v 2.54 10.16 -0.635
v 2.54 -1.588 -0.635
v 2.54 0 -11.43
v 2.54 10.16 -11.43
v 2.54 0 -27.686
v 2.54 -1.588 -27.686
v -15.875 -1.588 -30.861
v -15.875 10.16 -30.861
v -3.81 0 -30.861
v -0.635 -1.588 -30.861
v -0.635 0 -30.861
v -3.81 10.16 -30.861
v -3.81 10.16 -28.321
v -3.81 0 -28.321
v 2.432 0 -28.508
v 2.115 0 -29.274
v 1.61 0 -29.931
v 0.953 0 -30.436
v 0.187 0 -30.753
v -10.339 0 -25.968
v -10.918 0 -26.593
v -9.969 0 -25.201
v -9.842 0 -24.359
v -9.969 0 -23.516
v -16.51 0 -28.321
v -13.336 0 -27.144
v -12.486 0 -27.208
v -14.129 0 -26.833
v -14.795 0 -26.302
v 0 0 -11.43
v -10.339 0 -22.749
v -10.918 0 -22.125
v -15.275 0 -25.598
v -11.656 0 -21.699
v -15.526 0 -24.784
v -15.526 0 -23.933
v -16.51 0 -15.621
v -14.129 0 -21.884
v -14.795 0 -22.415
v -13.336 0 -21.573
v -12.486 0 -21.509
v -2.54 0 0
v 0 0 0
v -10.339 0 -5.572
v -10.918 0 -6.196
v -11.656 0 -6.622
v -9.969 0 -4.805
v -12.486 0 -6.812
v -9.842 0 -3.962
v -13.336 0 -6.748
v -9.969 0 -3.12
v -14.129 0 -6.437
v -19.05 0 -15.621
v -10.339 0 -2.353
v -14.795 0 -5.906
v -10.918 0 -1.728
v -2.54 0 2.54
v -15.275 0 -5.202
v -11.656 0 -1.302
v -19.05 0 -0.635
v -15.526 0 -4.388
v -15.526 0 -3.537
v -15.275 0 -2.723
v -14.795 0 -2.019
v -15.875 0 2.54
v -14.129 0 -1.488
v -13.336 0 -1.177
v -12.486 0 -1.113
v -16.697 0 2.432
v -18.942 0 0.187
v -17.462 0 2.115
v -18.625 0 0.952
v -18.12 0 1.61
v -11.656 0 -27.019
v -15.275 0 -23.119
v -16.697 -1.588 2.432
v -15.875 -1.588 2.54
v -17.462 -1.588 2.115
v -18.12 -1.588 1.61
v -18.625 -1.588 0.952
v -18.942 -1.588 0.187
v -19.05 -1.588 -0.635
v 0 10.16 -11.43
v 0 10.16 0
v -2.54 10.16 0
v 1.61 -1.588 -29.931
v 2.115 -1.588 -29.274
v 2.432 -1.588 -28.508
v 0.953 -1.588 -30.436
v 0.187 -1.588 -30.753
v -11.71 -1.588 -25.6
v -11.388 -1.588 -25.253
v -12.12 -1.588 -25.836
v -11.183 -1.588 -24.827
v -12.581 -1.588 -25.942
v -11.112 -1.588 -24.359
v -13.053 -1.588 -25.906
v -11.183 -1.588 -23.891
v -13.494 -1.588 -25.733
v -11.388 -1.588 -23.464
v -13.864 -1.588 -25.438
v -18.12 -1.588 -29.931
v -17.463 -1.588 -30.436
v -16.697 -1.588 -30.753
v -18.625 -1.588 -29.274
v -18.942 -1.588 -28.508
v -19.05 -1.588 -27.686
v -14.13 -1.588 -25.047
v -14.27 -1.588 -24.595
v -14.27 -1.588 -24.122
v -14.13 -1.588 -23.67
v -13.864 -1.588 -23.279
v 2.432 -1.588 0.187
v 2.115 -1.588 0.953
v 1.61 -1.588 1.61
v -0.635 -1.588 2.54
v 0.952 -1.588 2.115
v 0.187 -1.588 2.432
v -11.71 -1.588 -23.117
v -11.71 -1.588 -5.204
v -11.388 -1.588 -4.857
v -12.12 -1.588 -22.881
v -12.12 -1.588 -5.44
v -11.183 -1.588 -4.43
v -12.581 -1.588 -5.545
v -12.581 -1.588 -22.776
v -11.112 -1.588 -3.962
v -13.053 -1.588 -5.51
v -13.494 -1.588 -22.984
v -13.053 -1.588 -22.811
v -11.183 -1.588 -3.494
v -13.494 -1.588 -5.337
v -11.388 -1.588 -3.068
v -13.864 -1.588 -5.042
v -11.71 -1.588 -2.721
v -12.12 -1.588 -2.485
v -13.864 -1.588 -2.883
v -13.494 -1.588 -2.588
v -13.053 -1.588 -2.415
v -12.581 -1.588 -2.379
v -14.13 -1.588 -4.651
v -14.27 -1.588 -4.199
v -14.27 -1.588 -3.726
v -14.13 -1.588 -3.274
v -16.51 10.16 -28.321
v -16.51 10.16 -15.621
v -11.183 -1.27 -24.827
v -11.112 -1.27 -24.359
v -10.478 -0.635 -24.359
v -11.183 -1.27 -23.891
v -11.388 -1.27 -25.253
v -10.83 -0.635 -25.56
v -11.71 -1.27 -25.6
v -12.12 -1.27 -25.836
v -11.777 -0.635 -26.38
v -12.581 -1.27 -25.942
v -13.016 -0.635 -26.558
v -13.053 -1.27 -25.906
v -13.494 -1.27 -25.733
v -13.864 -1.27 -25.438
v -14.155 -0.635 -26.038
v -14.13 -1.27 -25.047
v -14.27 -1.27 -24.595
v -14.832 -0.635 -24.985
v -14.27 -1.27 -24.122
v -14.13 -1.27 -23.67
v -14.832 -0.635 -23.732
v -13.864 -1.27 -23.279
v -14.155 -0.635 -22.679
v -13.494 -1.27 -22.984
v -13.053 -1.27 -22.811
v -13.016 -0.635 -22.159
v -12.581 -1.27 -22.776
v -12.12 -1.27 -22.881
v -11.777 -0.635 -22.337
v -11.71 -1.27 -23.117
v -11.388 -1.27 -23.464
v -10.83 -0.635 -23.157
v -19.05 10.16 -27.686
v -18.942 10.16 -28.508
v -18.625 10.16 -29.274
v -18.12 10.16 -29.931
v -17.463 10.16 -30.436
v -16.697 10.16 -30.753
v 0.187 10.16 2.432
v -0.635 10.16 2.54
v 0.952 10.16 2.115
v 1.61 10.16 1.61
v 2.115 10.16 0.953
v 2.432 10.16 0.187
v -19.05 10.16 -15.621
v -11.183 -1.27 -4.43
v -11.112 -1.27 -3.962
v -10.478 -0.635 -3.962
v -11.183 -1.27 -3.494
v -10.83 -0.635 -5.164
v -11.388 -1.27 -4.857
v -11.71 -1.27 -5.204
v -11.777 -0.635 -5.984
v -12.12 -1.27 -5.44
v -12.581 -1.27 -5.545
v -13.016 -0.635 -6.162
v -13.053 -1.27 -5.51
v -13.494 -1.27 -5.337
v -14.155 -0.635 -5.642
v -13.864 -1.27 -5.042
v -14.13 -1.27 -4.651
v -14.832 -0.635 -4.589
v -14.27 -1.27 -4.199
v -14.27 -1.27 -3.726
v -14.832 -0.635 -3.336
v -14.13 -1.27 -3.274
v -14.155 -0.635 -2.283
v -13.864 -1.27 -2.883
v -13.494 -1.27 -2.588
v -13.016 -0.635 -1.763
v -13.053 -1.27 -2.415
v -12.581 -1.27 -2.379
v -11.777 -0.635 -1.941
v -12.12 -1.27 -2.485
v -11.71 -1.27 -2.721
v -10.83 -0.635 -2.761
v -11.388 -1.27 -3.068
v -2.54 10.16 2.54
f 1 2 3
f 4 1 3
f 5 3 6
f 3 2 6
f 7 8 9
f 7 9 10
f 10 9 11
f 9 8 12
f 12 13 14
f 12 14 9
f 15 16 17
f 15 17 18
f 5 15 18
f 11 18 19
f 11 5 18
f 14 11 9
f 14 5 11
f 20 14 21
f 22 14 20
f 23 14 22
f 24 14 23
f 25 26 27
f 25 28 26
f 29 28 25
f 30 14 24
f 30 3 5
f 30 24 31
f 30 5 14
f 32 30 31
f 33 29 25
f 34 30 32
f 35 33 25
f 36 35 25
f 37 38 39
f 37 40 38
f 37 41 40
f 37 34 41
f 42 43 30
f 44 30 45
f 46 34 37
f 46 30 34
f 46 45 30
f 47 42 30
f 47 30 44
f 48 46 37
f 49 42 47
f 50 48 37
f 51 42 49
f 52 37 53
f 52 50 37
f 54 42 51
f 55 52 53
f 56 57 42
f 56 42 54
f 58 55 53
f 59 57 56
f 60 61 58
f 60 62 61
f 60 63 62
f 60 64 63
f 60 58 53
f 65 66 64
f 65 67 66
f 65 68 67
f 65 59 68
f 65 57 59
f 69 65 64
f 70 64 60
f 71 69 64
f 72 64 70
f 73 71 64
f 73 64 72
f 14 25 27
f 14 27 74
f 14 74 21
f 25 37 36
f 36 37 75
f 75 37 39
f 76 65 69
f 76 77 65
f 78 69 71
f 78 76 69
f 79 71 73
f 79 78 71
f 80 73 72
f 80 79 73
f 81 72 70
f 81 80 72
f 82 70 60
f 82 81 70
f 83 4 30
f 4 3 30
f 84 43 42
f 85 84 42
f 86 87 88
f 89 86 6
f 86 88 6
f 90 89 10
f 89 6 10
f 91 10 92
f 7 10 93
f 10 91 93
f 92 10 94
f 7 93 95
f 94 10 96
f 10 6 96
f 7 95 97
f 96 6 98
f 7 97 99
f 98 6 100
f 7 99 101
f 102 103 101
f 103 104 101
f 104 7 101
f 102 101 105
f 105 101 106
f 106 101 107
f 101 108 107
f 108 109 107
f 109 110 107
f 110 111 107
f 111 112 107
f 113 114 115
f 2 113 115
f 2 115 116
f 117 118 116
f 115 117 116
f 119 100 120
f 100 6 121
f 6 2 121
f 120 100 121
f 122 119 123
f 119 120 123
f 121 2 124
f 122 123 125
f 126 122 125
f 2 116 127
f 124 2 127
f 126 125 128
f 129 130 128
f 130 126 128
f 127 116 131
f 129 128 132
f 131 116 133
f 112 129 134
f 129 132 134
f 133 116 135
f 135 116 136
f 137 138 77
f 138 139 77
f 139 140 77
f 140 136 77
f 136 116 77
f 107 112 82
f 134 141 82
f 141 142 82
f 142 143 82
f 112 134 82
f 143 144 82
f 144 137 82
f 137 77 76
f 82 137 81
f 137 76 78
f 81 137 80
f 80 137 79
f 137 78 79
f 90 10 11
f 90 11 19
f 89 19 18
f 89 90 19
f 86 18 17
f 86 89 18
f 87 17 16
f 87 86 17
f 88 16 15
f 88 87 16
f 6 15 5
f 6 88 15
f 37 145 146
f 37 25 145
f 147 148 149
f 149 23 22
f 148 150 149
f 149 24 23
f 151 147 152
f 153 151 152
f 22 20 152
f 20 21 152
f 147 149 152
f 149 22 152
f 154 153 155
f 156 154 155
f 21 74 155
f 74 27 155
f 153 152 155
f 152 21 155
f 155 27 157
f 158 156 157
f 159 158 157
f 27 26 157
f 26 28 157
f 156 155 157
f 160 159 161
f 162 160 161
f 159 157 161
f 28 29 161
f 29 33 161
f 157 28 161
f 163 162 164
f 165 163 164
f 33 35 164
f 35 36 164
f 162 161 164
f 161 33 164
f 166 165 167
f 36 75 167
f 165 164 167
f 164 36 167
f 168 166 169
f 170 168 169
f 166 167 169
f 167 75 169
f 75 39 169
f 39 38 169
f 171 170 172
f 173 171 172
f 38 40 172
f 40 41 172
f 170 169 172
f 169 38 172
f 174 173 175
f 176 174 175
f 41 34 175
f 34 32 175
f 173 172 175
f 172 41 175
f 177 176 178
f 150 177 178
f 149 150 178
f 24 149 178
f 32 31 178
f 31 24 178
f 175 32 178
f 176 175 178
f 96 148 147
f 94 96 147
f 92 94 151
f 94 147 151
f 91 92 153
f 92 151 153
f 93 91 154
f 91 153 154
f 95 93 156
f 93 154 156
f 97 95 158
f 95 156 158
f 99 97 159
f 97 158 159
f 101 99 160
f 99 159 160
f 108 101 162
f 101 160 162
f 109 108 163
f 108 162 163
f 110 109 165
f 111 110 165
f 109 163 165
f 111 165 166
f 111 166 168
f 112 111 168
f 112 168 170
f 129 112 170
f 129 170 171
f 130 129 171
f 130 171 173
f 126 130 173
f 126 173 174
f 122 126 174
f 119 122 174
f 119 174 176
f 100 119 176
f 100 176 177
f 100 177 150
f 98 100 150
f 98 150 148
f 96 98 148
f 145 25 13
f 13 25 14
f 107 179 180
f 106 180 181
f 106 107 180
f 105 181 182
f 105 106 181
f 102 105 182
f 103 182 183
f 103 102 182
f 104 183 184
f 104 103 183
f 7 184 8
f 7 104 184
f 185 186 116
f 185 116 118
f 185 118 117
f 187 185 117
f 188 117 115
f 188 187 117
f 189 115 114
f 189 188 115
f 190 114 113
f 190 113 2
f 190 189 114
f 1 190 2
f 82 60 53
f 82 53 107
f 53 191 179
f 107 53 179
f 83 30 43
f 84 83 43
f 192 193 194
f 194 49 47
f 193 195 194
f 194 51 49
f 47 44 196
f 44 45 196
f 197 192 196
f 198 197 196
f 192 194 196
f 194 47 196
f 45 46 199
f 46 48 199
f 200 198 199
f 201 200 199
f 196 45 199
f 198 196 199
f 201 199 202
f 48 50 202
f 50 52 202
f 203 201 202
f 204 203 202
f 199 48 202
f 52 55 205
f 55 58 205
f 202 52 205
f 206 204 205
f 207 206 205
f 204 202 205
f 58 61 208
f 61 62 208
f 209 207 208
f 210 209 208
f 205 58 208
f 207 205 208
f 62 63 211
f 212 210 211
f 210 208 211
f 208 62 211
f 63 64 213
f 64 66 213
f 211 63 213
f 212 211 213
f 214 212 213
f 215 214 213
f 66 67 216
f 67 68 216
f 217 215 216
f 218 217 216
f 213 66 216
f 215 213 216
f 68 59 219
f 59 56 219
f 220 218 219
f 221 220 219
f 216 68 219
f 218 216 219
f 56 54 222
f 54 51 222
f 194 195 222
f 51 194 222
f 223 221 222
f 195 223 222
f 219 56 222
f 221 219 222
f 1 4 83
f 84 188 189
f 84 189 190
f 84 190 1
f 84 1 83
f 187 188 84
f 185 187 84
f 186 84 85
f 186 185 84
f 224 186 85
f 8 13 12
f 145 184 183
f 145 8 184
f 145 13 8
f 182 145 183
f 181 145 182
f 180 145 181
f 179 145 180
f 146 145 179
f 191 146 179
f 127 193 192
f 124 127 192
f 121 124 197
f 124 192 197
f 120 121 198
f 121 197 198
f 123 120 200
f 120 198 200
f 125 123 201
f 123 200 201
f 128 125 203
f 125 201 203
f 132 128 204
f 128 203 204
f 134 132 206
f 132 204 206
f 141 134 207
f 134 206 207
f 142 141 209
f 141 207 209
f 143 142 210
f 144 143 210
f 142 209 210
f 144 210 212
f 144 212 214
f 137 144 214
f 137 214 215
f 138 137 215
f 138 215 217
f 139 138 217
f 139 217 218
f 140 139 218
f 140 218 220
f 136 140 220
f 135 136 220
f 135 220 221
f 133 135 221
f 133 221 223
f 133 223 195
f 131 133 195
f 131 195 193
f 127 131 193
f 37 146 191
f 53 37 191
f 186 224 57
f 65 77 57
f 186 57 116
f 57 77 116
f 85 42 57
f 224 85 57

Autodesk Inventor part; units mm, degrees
ref_plane "YZ Plane" through (0, 0, 0) normal (1, 0, 0) x (0, 1, 0)
ref_plane "XZ Plane" through (0, 0, 0) normal (0, 1, 0) x (-1, 0, 0)
ref_plane "XY Plane" through (0, 0, 0) normal (0, 0, 1) x (1, 0, 0)
sketch "Sketch2" plane through (0, 0, 0) normal (0, 1, 0) x (-1, 0, 0)
  line L0 (0, 0) -> (2.54, 0)
  line L1 (2.54, 0) -> (2.54, 2.54)
  line L2 (2.54, 2.54) -> (0, 2.54)
  line L3 (0, 2.54) -> (0, 0)
  line L4 (0, 0) -> (-2.54, 0)
  line L5 (-2.54, 0) -> (-2.54, -11.43)
  line L6 (-2.54, -11.43) -> (0, -11.43)
  line L7 (0, -11.43) -> (0, 0)
  line L8 (-2.54, 0) -> (0, 0)
  line L9 (0, 0) -> (0, 2.54)
  line L10 (0, 2.54) -> (-2.54, 2.54)
  line L11 (-2.54, 2.54) -> (-2.54, 0)
  line L12 (16.51, -15.621) -> (19.05, -15.621)
  line L13 (19.05, -15.621) -> (19.05, -28.321)
  line L14 (19.05, -28.321) -> (16.51, -28.321)
  line L15 (16.51, -28.321) -> (16.51, -15.621)
  line L16 (19.05, -28.321) -> (3.81, -28.321)
  line L17 (3.81, -28.321) -> (3.81, -30.861)
  line L18 (3.81, -30.861) -> (19.05, -30.861)
  line L19 (19.05, -30.861) -> (19.05, -28.321)
  line L20 (19.05, -30.861) -> (-2.54, -30.861)
  line L21 (-2.54, -30.861) -> (-2.54, 2.54)
  line L22 (-2.54, 2.54) -> (19.05, 2.54)
  line L23 (19.05, 2.54) -> (19.05, -30.861)
  line L24 (0, 0) -> (2.54, 0)
  line L25 (2.54, 0) -> (2.54, 2.54)
  line L26 (2.54, 2.54) -> (0, 2.54)
  line L27 (0, 2.54) -> (0, 0)
  line L28 (-2.54, -11.43) -> (0, -11.43)
  line L29 (0, -11.43) -> (0, 2.54)
  line L30 (0, 2.54) -> (-2.54, 2.54)
  line L31 (-2.54, 2.54) -> (-2.54, -11.43)
  dimension "d0" = 2.54
  dimension "d1" = 2.54
  dimension "d2" = 2.54
  dimension "d3" = 11.43
  dimension "d4" = 2.54
  dimension "d5" = 12.7
  dimension "d6" = 15.24
  dimension "d7" = 2.54
  dimension "d8" = 16.51
  dimension "d9" = 28.321
extrude "Extrusion1" add sketch "Sketch2" along normal blind 10.16 contours L3 L2 L1 L0 | L4 L11 L10 L3 | L7 L6 L5 L4 | L13 L14 L15 L12 | L17 L16 L14 L19 L18
extrude "Extrusion2" add sketch "Sketch2" against normal blind 1.5875
sketch "Sketch4" plane through (0, 0, 0) normal (0, 1, 0) x (1, 0, 0)
  circle A0 centre (-12.7, 3.9624) radius 1.5875
  circle A1 centre (-12.7, 24.3586) radius 1.5875
  line L0 (-19.05, 15.621) -> (-19.05, -2.54) projected
  line L1 (-19.05, -2.54) -> (-2.54, -2.54) projected
  line L2 (2.54, 30.861) -> (-3.81, 30.861) projected
  point P0 (0, 0)
  dimension "d14" = 3.175
  dimension "d15" = 3.175
  dimension "d16" = 6.35
  dimension "d17" = 6.35
  dimension "d23" = 20.3962
  dimension "d24" = 6.5024
  dimension "d25" = 33.401
extrude "Extrusion3" cut sketch "Sketch4" against normal blind 1.5875
fillet "Fillet1" radius 3.175 4 edges at (2.54, -0.7937, -30.861) (2.54, 4.2862, 2.54) (-19.05, -0.7937, 2.54) (-19.05, 4.2863, -30.861)
chamfer "Chamfer1" distance 1.27 angle 45 2 edges at (-14.2875, 0, -24.3586) (-14.2875, 0, -3.9624)
equation "\"d24\" = -0.5 * d23 + 0.5 * d25"
properties part number "limitSwitchHolder2" material "ABS Plastic"
